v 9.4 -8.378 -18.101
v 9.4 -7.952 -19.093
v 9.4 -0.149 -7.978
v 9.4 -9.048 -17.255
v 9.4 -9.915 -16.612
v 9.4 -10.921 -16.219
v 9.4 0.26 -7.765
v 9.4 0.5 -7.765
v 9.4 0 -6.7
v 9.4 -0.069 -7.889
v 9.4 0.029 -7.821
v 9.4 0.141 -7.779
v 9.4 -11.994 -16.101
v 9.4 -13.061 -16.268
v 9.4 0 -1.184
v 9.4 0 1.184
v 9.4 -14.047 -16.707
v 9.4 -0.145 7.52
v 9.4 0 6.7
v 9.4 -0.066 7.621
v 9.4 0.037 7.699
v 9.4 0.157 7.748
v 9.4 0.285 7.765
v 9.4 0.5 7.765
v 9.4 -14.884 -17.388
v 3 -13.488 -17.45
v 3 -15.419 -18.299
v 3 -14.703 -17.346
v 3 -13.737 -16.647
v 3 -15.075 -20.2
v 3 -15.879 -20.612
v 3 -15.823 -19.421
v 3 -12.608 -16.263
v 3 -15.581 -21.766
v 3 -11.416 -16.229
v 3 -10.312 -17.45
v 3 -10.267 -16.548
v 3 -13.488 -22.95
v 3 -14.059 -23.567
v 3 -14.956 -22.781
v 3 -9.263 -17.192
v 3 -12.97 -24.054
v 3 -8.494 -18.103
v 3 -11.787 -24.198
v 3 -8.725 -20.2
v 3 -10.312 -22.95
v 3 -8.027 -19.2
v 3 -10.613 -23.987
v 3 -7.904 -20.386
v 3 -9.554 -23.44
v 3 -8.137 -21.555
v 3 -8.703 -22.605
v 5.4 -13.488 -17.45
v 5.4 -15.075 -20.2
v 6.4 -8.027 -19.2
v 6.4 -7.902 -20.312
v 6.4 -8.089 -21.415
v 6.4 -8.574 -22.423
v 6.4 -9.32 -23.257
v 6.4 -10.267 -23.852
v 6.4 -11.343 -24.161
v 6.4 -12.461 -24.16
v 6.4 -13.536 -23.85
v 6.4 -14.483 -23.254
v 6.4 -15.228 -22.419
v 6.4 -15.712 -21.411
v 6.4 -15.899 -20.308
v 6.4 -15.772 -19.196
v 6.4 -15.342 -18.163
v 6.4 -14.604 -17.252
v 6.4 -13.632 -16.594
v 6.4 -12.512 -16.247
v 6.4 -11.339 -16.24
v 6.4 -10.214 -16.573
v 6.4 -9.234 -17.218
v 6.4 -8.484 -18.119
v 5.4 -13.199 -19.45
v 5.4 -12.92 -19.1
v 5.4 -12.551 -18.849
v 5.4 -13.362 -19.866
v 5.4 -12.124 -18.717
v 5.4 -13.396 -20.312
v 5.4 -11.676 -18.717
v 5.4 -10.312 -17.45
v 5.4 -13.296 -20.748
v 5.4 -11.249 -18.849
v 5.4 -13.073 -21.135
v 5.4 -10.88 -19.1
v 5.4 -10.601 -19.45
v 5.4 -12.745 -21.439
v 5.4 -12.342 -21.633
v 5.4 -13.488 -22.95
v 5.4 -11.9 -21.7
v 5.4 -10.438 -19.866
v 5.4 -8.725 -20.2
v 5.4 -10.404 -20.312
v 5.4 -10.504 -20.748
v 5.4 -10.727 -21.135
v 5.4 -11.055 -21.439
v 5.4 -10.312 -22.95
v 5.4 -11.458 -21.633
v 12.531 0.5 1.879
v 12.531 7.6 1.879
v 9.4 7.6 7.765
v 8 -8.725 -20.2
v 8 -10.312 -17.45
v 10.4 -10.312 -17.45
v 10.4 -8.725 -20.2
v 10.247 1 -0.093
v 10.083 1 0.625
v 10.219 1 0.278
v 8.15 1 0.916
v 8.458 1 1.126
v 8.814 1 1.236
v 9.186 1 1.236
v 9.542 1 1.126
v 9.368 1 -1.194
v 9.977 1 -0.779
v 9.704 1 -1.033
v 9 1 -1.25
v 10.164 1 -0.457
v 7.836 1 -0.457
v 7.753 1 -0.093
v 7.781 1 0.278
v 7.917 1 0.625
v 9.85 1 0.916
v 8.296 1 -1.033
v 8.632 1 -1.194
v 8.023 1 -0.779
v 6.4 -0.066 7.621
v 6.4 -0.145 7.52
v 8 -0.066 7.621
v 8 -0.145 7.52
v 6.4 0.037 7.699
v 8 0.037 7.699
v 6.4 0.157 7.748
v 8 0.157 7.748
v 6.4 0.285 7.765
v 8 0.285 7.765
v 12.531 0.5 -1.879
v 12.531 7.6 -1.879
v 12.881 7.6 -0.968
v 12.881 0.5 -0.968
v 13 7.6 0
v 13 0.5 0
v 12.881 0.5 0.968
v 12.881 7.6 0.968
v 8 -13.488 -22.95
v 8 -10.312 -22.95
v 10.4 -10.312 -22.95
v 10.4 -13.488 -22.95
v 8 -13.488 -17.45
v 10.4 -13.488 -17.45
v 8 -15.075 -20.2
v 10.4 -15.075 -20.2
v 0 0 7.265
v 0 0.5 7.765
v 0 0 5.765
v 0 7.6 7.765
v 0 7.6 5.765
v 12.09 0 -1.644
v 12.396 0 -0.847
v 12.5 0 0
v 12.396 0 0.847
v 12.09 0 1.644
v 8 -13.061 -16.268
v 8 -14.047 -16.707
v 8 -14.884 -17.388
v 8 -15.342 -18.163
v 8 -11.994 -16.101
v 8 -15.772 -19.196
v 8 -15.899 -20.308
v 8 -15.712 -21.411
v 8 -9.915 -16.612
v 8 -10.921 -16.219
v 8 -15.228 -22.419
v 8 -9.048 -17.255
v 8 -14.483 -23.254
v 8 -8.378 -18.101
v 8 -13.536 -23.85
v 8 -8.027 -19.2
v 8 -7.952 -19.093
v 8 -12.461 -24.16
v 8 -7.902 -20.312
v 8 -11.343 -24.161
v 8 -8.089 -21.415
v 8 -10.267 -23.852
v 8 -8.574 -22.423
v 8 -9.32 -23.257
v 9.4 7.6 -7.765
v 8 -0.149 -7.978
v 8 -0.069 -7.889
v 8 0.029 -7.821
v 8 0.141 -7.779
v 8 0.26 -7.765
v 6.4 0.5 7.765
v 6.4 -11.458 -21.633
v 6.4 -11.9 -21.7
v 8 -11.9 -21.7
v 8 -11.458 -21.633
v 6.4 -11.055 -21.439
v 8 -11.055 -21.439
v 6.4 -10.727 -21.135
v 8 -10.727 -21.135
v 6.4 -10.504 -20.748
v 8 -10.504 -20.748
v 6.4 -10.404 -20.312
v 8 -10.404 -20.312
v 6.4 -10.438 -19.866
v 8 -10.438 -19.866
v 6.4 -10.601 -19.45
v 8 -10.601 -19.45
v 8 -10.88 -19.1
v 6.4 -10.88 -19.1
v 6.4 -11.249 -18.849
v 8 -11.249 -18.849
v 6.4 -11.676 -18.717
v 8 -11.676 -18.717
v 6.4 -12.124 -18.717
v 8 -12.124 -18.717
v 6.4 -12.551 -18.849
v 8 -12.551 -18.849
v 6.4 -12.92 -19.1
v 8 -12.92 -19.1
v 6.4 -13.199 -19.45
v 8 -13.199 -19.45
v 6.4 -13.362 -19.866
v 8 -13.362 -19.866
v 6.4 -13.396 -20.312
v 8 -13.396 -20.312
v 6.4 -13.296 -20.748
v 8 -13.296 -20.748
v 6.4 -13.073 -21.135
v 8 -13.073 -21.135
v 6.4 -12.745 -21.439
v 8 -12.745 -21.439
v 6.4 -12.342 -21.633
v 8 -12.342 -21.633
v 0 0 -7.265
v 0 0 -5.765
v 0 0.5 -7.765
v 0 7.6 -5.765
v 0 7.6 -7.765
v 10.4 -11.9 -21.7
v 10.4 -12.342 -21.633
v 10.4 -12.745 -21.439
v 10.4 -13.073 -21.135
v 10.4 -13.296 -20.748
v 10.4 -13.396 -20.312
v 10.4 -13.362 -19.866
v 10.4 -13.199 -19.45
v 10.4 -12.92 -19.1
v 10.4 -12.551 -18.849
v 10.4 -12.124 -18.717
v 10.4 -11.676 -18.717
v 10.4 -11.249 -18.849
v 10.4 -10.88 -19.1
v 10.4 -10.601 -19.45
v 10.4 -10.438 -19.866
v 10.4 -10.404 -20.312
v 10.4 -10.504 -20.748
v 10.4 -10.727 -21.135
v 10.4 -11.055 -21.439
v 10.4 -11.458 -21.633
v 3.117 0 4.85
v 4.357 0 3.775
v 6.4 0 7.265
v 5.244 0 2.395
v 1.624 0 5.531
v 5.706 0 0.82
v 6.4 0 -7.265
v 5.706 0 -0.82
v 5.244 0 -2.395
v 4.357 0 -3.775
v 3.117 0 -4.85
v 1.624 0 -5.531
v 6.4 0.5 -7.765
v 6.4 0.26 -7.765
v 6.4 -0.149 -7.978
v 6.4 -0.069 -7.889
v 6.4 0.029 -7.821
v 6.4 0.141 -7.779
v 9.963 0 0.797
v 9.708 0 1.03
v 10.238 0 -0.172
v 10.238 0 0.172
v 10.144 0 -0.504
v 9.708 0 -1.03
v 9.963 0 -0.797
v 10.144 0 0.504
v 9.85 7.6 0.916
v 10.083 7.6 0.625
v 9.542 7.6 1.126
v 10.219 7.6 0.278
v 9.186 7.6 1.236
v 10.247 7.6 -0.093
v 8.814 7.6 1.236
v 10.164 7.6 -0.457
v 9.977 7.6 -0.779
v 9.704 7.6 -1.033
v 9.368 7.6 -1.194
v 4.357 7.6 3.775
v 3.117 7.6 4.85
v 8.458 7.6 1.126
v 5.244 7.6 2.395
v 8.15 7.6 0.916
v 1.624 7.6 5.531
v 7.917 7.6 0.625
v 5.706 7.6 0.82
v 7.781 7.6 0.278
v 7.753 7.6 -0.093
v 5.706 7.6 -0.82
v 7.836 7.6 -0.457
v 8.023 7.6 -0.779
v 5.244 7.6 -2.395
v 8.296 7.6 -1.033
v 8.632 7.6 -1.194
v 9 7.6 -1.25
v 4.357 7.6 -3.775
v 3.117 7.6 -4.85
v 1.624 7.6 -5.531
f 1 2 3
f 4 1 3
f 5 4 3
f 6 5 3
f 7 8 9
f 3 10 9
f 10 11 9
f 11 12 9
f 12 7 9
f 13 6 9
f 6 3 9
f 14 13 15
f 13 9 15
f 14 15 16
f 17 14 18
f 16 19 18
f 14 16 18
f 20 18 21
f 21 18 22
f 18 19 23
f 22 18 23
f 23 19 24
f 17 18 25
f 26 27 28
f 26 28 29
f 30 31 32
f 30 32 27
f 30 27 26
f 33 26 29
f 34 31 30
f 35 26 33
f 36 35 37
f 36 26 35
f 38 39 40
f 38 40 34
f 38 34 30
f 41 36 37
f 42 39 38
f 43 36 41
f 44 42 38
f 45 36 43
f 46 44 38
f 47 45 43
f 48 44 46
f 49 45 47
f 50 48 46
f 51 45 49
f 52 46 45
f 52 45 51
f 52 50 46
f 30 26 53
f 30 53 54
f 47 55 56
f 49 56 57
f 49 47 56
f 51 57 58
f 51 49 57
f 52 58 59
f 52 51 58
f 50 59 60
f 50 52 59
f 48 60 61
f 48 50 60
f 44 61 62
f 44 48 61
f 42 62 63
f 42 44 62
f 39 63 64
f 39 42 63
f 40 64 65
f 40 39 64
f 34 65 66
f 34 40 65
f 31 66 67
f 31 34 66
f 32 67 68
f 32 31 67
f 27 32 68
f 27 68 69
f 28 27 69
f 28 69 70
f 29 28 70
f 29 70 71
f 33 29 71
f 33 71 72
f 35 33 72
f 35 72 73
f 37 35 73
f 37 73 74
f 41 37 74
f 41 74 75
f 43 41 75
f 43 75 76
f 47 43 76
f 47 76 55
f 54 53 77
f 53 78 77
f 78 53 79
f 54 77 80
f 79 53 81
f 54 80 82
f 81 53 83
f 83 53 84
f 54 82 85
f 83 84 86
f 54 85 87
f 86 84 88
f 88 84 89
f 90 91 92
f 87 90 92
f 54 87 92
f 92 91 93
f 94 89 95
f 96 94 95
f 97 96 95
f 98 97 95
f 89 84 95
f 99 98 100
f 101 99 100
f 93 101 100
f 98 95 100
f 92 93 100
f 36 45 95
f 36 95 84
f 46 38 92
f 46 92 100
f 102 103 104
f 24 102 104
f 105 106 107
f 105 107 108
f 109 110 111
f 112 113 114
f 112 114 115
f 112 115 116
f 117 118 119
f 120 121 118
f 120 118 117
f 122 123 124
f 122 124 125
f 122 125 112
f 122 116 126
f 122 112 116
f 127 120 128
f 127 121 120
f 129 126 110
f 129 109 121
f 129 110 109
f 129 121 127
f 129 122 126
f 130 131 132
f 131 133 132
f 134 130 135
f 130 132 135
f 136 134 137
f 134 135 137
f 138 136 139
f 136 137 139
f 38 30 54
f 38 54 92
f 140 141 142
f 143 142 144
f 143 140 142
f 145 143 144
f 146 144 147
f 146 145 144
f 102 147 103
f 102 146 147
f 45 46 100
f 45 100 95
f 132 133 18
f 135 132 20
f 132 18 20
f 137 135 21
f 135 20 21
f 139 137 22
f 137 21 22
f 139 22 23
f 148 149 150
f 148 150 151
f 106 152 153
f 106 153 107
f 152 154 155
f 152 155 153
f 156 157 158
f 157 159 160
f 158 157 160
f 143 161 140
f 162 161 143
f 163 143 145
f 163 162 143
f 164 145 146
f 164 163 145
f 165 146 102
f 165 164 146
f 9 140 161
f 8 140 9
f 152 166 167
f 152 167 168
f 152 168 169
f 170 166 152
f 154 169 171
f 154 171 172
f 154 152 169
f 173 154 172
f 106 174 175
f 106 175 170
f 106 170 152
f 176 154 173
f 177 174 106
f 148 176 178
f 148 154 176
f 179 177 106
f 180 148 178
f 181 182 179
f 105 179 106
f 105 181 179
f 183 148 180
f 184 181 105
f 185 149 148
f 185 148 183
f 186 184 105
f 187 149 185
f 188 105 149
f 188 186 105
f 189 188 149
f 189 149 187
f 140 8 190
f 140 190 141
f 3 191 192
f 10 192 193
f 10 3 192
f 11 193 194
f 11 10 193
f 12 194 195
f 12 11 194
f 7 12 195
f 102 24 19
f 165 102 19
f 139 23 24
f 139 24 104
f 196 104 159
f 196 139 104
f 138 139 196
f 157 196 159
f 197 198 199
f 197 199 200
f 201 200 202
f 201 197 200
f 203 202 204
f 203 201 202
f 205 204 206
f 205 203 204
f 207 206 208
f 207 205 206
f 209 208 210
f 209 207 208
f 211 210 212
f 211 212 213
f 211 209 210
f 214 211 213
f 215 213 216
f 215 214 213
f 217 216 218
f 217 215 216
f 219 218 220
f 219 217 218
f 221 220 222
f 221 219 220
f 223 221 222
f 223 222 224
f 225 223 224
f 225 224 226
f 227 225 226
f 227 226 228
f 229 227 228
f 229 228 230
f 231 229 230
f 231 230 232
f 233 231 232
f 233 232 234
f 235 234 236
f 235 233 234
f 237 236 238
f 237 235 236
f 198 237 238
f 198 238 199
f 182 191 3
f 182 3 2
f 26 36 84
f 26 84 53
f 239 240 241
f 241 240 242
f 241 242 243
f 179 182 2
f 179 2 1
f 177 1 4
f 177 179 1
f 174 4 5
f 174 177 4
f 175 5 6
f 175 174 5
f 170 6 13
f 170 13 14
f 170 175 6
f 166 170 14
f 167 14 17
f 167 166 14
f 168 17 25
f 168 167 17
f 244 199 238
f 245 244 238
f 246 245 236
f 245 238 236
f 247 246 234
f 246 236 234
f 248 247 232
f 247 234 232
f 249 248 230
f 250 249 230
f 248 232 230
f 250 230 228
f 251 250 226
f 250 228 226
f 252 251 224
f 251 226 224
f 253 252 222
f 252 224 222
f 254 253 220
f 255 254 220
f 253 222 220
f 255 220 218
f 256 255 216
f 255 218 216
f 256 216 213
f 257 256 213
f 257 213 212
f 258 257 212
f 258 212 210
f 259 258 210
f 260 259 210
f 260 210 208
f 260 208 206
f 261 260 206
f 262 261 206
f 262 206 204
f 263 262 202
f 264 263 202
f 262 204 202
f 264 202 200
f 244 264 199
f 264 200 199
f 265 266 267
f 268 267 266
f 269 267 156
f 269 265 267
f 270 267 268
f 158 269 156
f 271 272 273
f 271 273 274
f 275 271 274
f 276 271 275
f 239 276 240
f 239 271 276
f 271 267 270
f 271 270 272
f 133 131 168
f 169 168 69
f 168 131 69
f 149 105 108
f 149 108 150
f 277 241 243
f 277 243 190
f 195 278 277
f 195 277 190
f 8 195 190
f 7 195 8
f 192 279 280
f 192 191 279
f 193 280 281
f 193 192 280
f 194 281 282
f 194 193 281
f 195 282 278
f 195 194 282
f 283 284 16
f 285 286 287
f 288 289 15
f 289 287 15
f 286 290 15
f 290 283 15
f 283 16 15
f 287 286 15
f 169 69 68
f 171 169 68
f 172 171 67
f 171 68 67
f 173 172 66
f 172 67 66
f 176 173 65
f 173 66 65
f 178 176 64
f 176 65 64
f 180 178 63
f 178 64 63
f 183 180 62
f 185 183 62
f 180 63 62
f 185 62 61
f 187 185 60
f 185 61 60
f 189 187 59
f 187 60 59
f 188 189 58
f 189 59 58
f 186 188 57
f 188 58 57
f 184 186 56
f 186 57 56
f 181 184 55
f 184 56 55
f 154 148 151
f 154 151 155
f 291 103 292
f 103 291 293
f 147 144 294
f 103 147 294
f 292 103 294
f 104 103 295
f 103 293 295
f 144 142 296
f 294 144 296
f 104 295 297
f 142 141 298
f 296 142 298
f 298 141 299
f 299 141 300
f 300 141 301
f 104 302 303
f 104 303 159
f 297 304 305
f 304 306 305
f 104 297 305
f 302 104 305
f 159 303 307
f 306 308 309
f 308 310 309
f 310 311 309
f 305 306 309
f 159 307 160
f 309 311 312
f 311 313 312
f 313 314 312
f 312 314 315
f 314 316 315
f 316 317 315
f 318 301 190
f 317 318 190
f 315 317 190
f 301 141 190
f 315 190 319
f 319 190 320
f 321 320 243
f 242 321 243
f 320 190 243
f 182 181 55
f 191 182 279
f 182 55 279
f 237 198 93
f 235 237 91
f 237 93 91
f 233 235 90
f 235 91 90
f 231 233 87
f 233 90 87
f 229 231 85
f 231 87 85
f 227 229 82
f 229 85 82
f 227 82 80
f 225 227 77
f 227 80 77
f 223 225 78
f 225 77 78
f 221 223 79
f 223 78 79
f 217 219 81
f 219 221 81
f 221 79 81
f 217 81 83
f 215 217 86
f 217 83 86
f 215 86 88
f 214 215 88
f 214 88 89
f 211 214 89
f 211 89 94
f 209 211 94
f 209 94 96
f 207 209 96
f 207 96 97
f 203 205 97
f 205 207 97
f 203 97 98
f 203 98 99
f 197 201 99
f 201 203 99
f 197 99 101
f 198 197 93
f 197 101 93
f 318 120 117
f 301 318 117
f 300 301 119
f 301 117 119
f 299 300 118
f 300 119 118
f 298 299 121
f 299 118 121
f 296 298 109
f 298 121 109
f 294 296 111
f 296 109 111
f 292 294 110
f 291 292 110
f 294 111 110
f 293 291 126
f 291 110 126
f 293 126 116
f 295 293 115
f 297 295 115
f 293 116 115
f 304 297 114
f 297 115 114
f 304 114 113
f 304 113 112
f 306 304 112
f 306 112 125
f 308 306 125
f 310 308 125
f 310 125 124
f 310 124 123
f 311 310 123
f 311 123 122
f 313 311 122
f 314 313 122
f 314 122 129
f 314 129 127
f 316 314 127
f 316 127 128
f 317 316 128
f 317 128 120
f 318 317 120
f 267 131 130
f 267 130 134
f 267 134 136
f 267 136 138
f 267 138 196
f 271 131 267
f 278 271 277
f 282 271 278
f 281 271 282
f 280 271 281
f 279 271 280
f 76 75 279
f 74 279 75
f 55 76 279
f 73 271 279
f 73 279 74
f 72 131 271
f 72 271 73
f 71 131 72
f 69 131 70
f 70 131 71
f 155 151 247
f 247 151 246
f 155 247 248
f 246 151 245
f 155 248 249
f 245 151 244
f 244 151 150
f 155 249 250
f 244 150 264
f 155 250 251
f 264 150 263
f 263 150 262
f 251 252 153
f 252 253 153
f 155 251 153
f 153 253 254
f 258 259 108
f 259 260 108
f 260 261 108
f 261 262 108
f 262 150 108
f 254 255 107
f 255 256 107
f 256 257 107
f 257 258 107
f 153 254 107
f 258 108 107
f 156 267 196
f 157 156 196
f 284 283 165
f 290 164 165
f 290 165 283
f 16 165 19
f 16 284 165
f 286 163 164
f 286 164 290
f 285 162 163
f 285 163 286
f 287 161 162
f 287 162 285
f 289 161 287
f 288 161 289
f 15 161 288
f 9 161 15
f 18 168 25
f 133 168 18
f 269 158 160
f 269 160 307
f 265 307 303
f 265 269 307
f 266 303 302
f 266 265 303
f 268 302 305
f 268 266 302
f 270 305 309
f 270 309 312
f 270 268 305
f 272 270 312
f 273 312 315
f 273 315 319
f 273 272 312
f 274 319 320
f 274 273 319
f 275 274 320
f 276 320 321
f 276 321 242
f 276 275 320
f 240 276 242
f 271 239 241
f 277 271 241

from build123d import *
from build123d.topology import SkipClean

# Parameters (mm, degrees)
SKETCH1_R            = 1.25
BRACKET_DEPTH        = 7.6
SKETCH2_R            = 1.5
ARM_DEPTH            = 1.6
SKETCH3_R            = 1.25
MOUNT_BLIND_DEPTH    = 1
EFFECTOR_START       = -5
SKETCH4_R            = 4
SKETCH4_R_2          = 1.5
EFFECTOR_MOUNT_DEPTH = 5
MOUNT_TRAP_DEPTH     = 2.4
SKETCH6_R            = 1.5
MOUNT_ADAPTOR_DEPTH  = 2.4
SKETCH7_W            = 12.99999996
SKETCH7_H            = 31.965
MIRROR_DELETE_DEPTH  = 37.150933583
ARM_SUPPORT_DEPTH    = 1.4
BODY_CHAMFER_SIZE    = 0.5
ARM_FILLET_R         = 0.5


with BuildPart() as part:
    # Sketch1 → Bracket (new body)
    with BuildSketch(Plane(origin=(0, 0, 0), x_dir=(1, 0, 0), z_dir=(0, 1, 0))):
        with BuildLine():
            Line((0, 7.765), (-9.4, 7.765))
            Line((-9.4, 7.765), (-12.531403257, 1.878614127))
            ThreePointArc((-12.531403257, 1.878614127), (-12.99999996, 0), (-12.531403257, -1.878614127))
            Line((-12.531403257, -1.878614127), (-9.4, -7.765))
            Line((-9.4, -7.765), (0, -7.765))
            Line((0, -7.765), (0, -5.765))
            ThreePointArc((0, -5.765), (-5.765, 0), (0, 5.765))
            Line((0, 5.765), (0, 7.765))
        make_face()
        with Locations(Location((-9, 0, 0), (0, 0, 90))):
            Circle(SKETCH1_R, mode=Mode.SUBTRACT)
    bracket = extrude(amount=BRACKET_DEPTH)

    # Sketch2 → Arm (add)
    with BuildSketch(Plane(origin=(-6.4, 0, 0), x_dir=(0, 0, -1), z_dir=(1, 0, 0))):
        with BuildLine():
            Line((-7.765, 0), (18.162978801, -15.342462002))
            ThreePointArc((18.162978801, -15.342462002), (24.160405232, -12.461418203), (19.2, -8.027016654))
            Line((19.2, -8.027016654), (7.765, 0))
            Line((7.765, 0), (-7.765, 0))
        make_face()
        with Locations((20.2, -11.9)):
            Circle(SKETCH2_R, mode=Mode.SUBTRACT)
    arm = extrude(amount=-ARM_DEPTH)

    # Sketch3 → Mount Blind (add)
    with BuildSketch(Plane.XZ):
        with Locations(Location((-9, 0, 0), (0, 0, 270))):
            Circle(SKETCH3_R)
    mount_blind = extrude(amount=-MOUNT_BLIND_DEPTH)

    # Sketch4 → Effector Mount (add)
    with SkipClean():  # the faces are left unmerged after this step: merging them gives an invalid solid
        with BuildSketch(Plane.ZY.offset(8).offset(EFFECTOR_START)):
            with Locations(Location((-20.2, -11.9, 0), (0, 0, 75.522487814))):
                Circle(SKETCH4_R)
            with Locations(Location((-20.2, -11.9, 0), (0, 0, 180))):
                Circle(SKETCH4_R_2, mode=Mode.SUBTRACT)
        effector_mount = extrude(amount=EFFECTOR_MOUNT_DEPTH)

    # Sketch5 → Mount Trap (cut)
    with SkipClean():  # the faces are left unmerged after this step: merging them gives an invalid solid
        with BuildSketch(Plane(origin=(-3, 0, 0), x_dir=(0, 0, -1), z_dir=(1, 0, 0))):
            Polygon((20.2, -8.724573519), (17.45, -10.31228676), (17.45, -13.48771324), (20.2, -15.075426481), (22.95, -13.48771324), (22.95, -10.31228676), align=None)
        mount_trap = extrude(amount=-MOUNT_TRAP_DEPTH, mode=Mode.SUBTRACT)

    # Sketch6 → Mount Adaptor (add)
    with SkipClean():  # the faces are left unmerged after this step: merging them gives an invalid solid
        with BuildSketch(Plane.ZY.offset(8)):
            Polygon((-17.45, -10.31228676), (-20.2, -8.724573519), (-22.95, -10.31228676), (-22.95, -13.48771324), (-20.2, -15.075426481), (-17.45, -13.48771324), align=None)
            with Locations(Location((-20.2, -11.9, 0), (0, 0, 180))):
                Circle(SKETCH6_R, mode=Mode.SUBTRACT)
        mount_adaptor = extrude(amount=MOUNT_ADAPTOR_DEPTH)

    # Mirror 2: Bracket, Arm, Mount Blind, Effector Mount, Mount Trap, Mount Adaptor across plane
    with SkipClean():  # the faces are left unmerged after this step: merging them gives an invalid solid
        add(bracket.mirror(Plane(origin=(0, 0, 0), x_dir=(0, 0, 1), z_dir=(1, 0, 0))))
        add(arm.mirror(Plane(origin=(0, 0, 0), x_dir=(0, 0, 1), z_dir=(1, 0, 0))))
        add(mount_blind.mirror(Plane(origin=(0, 0, 0), x_dir=(0, 0, 1), z_dir=(1, 0, 0))))
        add(effector_mount.mirror(Plane(origin=(0, 0, 0), x_dir=(0, 0, 1), z_dir=(1, 0, 0))))
        add(mount_trap.mirror(Plane(origin=(0, 0, 0), x_dir=(0, 0, 1), z_dir=(1, 0, 0))), mode=Mode.SUBTRACT)
        add(mount_adaptor.mirror(Plane(origin=(0, 0, 0), x_dir=(0, 0, 1), z_dir=(1, 0, 0))))

    # Sketch7 → Mirror Delete (cut, through all)
    with SkipClean():  # the faces are left unmerged after this step: merging them gives an invalid solid
        with BuildSketch(Plane(origin=(0, 7.6, 0), x_dir=(1, 0, 0), z_dir=(0, 1, 0))):
            with Locations((-6.49999998, 8.2175)):
                Rectangle(SKETCH7_W, SKETCH7_H)
        extrude(amount=-MIRROR_DELETE_DEPTH, mode=Mode.SUBTRACT)

    # Sketch8 → Arm Support (add)
    with SkipClean():  # the faces are left unmerged after this step: merging them gives an invalid solid
        with BuildSketch(Plane(origin=(8, 0, 0), x_dir=(0, 0, -1), z_dir=(1, 0, 0))):
            with BuildLine():
                Line((7.765, 0), (19.093373314, -7.952168015))
                ThreePointArc((19.093373314, -7.952168015), (16.218654953, -10.920769884), (17.388424851, -14.884132232))
                Line((17.388424851, -14.884132232), (-7.765, 0))
                Line((-7.765, 0), (7.765, 0))
            make_face()
        extrude(amount=ARM_SUPPORT_DEPTH)

    # Body Chamfer
    # the kernel refuses this chamfer: 0.5 mm, written as the material it takes off along each edge
    with BuildSketch(Plane(origin=(8.796100001, 0, -8.90020621), x_dir=(0.024274757051952575, 0.9996219169112968, -0.012913535559763734), z_dir=(0.4696535317878062, 0, 0.8828508141692119))) as body_chamfer_piece_1_section:
        Polygon((BODY_CHAMFER_SIZE * 0.999621916911, BODY_CHAMFER_SIZE * 0.0274958766106), (-BODY_CHAMFER_SIZE * 0.0274958766106, BODY_CHAMFER_SIZE * 0.999621916911), (0, 0), align=None)
    body_chamfer_piece_1 = extrude(amount=7.953316653, mode=Mode.PRIVATE)
    body_chamfer_piece_1 = split(body_chamfer_piece_1, bisect_by=Plane(origin=(9.4, 0.324892832, -7.480239841), z_dir=(1, 0, 0)), keep=Keep.TOP, mode=Mode.PRIVATE)
    add(body_chamfer_piece_1, mode=Mode.SUBTRACT)
    with BuildSketch(Plane(origin=(8.999999655, 0, 0), x_dir=(0.8828508331840651, 0, -0.4696534960438411), z_dir=(-0.4696534960438411, 0, -0.8828508331840651))) as body_chamfer_piece_2:
        Polygon((4.000000304, -BODY_CHAMFER_SIZE), (4.000000304 - BODY_CHAMFER_SIZE, 0), (4.000000304, 0), align=None)
    revolve(axis=Axis((8.999999655, 0, 0), (0, -1, 0)), revolution_arc=56.023613132, mode=Mode.SUBTRACT)
    with BuildSketch(Plane(origin=(12.531403257, 0, 1.878614127), x_dir=(0.02427475705195258, 0.9996219169112968, 0.012913535559763729), z_dir=(-0.46965353178780606, 0, 0.8828508141692119))) as body_chamfer_piece_3_section:
        Polygon((BODY_CHAMFER_SIZE * 0.999621916911, BODY_CHAMFER_SIZE * 0.0274958766106), (-BODY_CHAMFER_SIZE * 0.0274958766106, BODY_CHAMFER_SIZE * 0.999621916911), (0, 0), align=None)
    body_chamfer_piece_3 = extrude(amount=7.953316653, mode=Mode.PRIVATE)
    body_chamfer_piece_3 = split(body_chamfer_piece_3, bisect_by=Plane(origin=(9.4, 0.173767424, 5.065126353), z_dir=(1, 0, 0)), keep=Keep.TOP, mode=Mode.PRIVATE)
    add(body_chamfer_piece_3, mode=Mode.SUBTRACT)
    with BuildSketch(Plane(origin=(6.4, 0, 7.765), x_dir=(0, -0.02749587661058639, -0.9996219169112968), z_dir=(-1, 0, 0)), Plane(origin=(-1.285841494, 0, -7.765), x_dir=(0, -0.02749587661058639, 0.9996219169112968), z_dir=(1, 0, 0))) as body_chamfer_piece_4:
        Polygon((BODY_CHAMFER_SIZE * 0.999621916911, -BODY_CHAMFER_SIZE * 0.0274958766106), (-BODY_CHAMFER_SIZE * 0.0274958766106, -BODY_CHAMFER_SIZE * 0.999621916911), (0, 0), align=None)
    extrude(amount=7.685841494, mode=Mode.SUBTRACT)
    with BuildSketch(Plane(origin=(10.693671764, 0, 7.765), x_dir=(0, 0.9998167148671796, 0.019145147484436967), z_dir=(-1, 0, 0))) as body_chamfer_piece_5_section:
        Polygon((BODY_CHAMFER_SIZE * 0.999816714867, BODY_CHAMFER_SIZE * 0.0191451474844), (-BODY_CHAMFER_SIZE * 0.52563857146, BODY_CHAMFER_SIZE * 0.850707994669), (0, 0), align=None)
    body_chamfer_piece_5 = extrude(amount=2.693671764, mode=Mode.PRIVATE)
    body_chamfer_piece_5 = split(body_chamfer_piece_5, bisect_by=Plane(origin=(9.4, 0.125, 7.622443684), z_dir=(1, 0, 0)), keep=Keep.TOP, mode=Mode.PRIVATE)
    add(body_chamfer_piece_5, mode=Mode.SUBTRACT)

    # Arm Fillet
    arm_fillet_edges = [part.edges().sort_by_distance(p)[0] for p in [
        (7.2, 0, -7.765),
        (7.2, 0, 7.765),
    ]]
    fillet(arm_fillet_edges, radius=ARM_FILLET_R)


solid = part.part
